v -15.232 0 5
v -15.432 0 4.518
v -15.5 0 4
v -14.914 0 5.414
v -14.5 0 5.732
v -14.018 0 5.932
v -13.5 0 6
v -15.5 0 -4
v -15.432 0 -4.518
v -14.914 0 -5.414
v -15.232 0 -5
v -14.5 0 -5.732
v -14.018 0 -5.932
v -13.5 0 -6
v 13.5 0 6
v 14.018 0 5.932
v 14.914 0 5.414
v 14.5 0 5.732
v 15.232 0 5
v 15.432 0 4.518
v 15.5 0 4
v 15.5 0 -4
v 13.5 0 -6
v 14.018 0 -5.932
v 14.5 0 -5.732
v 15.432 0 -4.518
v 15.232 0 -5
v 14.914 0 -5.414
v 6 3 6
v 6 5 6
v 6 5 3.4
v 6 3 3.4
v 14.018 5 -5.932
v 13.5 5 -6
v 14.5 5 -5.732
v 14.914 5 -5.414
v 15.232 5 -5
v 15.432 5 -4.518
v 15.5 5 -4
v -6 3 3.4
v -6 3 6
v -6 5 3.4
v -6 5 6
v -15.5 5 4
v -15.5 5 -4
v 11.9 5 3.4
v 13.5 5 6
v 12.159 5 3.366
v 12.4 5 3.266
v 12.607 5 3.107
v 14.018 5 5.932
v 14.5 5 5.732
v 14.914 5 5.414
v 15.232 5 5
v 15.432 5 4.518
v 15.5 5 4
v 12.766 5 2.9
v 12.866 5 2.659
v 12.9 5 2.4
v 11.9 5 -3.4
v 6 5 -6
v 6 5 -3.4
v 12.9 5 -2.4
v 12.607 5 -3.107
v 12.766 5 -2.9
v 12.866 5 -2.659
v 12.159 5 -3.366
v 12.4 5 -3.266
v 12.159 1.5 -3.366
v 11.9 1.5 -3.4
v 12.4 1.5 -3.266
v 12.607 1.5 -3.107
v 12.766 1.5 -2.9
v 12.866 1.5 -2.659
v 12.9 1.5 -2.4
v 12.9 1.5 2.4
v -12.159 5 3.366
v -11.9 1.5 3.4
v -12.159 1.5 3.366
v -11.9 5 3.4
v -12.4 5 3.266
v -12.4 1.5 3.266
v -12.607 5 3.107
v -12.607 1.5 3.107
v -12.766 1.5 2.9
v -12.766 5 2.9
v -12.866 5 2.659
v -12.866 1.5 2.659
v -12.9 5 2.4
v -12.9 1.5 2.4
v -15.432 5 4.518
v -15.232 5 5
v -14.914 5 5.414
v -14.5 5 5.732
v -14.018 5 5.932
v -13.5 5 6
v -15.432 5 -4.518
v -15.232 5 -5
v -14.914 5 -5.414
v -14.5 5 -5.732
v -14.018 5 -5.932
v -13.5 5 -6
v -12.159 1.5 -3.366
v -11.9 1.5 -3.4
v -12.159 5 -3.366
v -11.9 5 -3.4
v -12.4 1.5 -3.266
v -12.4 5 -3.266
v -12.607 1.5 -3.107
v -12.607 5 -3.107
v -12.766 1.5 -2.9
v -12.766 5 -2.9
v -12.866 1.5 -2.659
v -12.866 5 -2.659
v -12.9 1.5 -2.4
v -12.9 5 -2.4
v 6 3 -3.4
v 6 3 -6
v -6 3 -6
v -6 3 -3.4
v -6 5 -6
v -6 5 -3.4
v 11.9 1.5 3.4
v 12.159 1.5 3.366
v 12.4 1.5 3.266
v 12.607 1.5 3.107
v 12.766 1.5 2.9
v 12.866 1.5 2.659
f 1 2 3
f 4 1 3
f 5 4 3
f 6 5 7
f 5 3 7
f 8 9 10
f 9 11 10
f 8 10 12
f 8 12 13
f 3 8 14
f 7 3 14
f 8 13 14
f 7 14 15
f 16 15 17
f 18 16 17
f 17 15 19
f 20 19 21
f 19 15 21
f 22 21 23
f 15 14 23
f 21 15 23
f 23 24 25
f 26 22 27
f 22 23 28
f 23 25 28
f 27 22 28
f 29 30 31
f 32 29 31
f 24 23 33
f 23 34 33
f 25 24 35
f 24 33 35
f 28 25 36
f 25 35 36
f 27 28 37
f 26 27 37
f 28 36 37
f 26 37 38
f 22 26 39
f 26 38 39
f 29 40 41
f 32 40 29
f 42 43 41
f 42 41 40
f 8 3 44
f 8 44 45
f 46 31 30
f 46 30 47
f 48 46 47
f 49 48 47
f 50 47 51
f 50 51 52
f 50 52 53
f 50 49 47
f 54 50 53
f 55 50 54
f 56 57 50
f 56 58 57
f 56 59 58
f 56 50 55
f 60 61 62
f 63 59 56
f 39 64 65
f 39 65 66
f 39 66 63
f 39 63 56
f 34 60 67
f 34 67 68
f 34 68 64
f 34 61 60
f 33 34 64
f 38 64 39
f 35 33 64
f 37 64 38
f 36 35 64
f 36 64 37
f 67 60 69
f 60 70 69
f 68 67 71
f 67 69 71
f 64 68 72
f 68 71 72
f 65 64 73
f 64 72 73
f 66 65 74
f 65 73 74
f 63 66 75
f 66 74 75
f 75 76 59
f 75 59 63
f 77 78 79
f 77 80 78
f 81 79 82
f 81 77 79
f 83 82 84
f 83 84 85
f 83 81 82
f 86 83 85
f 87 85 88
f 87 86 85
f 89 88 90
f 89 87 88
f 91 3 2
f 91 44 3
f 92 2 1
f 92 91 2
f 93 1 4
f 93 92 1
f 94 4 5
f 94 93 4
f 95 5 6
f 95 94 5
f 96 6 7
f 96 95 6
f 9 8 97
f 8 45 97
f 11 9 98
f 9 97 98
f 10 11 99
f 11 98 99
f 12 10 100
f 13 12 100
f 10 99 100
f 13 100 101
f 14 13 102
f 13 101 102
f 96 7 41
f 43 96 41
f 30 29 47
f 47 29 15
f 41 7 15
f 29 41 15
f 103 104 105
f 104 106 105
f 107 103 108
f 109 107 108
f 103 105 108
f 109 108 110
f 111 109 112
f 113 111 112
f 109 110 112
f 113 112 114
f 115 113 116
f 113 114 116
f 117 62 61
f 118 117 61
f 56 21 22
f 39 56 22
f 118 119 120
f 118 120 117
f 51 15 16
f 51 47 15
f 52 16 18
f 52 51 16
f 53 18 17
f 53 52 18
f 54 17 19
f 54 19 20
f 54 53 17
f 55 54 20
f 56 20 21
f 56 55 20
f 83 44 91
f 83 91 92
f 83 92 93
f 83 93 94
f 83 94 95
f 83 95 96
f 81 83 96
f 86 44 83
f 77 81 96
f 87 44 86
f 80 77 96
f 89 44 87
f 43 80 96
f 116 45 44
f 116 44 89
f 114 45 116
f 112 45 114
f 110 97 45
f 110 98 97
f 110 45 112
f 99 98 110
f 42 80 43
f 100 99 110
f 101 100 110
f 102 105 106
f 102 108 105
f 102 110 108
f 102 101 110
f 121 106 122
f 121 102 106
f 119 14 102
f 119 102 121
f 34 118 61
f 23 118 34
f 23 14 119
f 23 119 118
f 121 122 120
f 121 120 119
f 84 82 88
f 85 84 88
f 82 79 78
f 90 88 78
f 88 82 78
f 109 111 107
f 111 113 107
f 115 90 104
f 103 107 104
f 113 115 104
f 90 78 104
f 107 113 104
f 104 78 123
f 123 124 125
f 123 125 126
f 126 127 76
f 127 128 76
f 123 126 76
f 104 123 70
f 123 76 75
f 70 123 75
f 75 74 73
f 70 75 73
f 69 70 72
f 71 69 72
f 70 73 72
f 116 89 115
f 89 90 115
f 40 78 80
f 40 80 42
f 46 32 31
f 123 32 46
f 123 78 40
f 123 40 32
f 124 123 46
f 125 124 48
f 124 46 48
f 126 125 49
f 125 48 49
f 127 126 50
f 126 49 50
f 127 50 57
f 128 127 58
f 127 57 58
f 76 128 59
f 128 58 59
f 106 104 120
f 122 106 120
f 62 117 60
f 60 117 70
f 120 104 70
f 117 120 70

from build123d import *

# Parameters (mm, degrees)
SKETCH1_W                 = 31
SKETCH1_H                 = 12
BOSS_EXTRUDE1_DEPTH       = 5
SHELL1_T                  = -2.6
SHELL1_THICKNESS_2_FACE_W = 6.8
SHELL1_THICKNESS_2_FACE_H = 25.8
SHELL1_THICKNESS_2_DEPTH  = 1.1
SKETCH2_W                 = 12
SKETCH2_H                 = 12
CUT_EXTRUDE1_DEPTH        = 2
FILLET1_R                 = 2
FILLET2_R                 = 1


with BuildPart() as part:
    # Sketch1 → Boss-Extrude1 (new body)
    with BuildSketch(Plane(origin=(0, 0, 0), x_dir=(1, 0, 0), z_dir=(0, 1, 0))):
        Rectangle(SKETCH1_W, SKETCH1_H)
    extrude(amount=BOSS_EXTRUDE1_DEPTH)

    # Shell1
    shell1_openings = [part.faces().sort_by_distance(p)[0] for p in [
        (0, 5, 0),
    ]]
    offset(amount=SHELL1_T, openings=shell1_openings, kind=Kind.INTERSECTION)

    # Shell1 thickness 2 face (on inner face of the shell) → Shell1 thickness 2 (cut)
    with BuildSketch(Plane(origin=(0, 2.6, 0), x_dir=(0, 0, -1), z_dir=(0, -1, 0))):
        Rectangle(SHELL1_THICKNESS_2_FACE_W, SHELL1_THICKNESS_2_FACE_H)
    extrude(amount=SHELL1_THICKNESS_2_DEPTH, mode=Mode.SUBTRACT)

    # Sketch2 → Cut-Extrude1 (cut)
    with BuildSketch(Plane(origin=(0, 5, 0), x_dir=(1, 0, 0), z_dir=(0, 1, 0))):
        Rectangle(SKETCH2_W, SKETCH2_H)
    extrude(amount=-CUT_EXTRUDE1_DEPTH, mode=Mode.SUBTRACT)

    # Fillet1
    fillet1_edges = [part.edges().sort_by_distance(p)[0] for p in [
        (15.5, 2.5, 6),
        (-15.5, 2.5, 6),
        (-15.5, 2.5, -6),
        (15.5, 2.5, -6),
    ]]
    fillet(fillet1_edges, radius=FILLET1_R)

    # Fillet2
    fillet2_edges = [part.edges().sort_by_distance(p)[0] for p in [
        (12.9, 3.25, 3.4),
        (12.9, 3.25, -3.4),
        (-12.9, 3.25, -3.4),
        (-12.9, 3.25, 3.4),
    ]]
    fillet(fillet2_edges, radius=FILLET2_R)


solid = part.part
